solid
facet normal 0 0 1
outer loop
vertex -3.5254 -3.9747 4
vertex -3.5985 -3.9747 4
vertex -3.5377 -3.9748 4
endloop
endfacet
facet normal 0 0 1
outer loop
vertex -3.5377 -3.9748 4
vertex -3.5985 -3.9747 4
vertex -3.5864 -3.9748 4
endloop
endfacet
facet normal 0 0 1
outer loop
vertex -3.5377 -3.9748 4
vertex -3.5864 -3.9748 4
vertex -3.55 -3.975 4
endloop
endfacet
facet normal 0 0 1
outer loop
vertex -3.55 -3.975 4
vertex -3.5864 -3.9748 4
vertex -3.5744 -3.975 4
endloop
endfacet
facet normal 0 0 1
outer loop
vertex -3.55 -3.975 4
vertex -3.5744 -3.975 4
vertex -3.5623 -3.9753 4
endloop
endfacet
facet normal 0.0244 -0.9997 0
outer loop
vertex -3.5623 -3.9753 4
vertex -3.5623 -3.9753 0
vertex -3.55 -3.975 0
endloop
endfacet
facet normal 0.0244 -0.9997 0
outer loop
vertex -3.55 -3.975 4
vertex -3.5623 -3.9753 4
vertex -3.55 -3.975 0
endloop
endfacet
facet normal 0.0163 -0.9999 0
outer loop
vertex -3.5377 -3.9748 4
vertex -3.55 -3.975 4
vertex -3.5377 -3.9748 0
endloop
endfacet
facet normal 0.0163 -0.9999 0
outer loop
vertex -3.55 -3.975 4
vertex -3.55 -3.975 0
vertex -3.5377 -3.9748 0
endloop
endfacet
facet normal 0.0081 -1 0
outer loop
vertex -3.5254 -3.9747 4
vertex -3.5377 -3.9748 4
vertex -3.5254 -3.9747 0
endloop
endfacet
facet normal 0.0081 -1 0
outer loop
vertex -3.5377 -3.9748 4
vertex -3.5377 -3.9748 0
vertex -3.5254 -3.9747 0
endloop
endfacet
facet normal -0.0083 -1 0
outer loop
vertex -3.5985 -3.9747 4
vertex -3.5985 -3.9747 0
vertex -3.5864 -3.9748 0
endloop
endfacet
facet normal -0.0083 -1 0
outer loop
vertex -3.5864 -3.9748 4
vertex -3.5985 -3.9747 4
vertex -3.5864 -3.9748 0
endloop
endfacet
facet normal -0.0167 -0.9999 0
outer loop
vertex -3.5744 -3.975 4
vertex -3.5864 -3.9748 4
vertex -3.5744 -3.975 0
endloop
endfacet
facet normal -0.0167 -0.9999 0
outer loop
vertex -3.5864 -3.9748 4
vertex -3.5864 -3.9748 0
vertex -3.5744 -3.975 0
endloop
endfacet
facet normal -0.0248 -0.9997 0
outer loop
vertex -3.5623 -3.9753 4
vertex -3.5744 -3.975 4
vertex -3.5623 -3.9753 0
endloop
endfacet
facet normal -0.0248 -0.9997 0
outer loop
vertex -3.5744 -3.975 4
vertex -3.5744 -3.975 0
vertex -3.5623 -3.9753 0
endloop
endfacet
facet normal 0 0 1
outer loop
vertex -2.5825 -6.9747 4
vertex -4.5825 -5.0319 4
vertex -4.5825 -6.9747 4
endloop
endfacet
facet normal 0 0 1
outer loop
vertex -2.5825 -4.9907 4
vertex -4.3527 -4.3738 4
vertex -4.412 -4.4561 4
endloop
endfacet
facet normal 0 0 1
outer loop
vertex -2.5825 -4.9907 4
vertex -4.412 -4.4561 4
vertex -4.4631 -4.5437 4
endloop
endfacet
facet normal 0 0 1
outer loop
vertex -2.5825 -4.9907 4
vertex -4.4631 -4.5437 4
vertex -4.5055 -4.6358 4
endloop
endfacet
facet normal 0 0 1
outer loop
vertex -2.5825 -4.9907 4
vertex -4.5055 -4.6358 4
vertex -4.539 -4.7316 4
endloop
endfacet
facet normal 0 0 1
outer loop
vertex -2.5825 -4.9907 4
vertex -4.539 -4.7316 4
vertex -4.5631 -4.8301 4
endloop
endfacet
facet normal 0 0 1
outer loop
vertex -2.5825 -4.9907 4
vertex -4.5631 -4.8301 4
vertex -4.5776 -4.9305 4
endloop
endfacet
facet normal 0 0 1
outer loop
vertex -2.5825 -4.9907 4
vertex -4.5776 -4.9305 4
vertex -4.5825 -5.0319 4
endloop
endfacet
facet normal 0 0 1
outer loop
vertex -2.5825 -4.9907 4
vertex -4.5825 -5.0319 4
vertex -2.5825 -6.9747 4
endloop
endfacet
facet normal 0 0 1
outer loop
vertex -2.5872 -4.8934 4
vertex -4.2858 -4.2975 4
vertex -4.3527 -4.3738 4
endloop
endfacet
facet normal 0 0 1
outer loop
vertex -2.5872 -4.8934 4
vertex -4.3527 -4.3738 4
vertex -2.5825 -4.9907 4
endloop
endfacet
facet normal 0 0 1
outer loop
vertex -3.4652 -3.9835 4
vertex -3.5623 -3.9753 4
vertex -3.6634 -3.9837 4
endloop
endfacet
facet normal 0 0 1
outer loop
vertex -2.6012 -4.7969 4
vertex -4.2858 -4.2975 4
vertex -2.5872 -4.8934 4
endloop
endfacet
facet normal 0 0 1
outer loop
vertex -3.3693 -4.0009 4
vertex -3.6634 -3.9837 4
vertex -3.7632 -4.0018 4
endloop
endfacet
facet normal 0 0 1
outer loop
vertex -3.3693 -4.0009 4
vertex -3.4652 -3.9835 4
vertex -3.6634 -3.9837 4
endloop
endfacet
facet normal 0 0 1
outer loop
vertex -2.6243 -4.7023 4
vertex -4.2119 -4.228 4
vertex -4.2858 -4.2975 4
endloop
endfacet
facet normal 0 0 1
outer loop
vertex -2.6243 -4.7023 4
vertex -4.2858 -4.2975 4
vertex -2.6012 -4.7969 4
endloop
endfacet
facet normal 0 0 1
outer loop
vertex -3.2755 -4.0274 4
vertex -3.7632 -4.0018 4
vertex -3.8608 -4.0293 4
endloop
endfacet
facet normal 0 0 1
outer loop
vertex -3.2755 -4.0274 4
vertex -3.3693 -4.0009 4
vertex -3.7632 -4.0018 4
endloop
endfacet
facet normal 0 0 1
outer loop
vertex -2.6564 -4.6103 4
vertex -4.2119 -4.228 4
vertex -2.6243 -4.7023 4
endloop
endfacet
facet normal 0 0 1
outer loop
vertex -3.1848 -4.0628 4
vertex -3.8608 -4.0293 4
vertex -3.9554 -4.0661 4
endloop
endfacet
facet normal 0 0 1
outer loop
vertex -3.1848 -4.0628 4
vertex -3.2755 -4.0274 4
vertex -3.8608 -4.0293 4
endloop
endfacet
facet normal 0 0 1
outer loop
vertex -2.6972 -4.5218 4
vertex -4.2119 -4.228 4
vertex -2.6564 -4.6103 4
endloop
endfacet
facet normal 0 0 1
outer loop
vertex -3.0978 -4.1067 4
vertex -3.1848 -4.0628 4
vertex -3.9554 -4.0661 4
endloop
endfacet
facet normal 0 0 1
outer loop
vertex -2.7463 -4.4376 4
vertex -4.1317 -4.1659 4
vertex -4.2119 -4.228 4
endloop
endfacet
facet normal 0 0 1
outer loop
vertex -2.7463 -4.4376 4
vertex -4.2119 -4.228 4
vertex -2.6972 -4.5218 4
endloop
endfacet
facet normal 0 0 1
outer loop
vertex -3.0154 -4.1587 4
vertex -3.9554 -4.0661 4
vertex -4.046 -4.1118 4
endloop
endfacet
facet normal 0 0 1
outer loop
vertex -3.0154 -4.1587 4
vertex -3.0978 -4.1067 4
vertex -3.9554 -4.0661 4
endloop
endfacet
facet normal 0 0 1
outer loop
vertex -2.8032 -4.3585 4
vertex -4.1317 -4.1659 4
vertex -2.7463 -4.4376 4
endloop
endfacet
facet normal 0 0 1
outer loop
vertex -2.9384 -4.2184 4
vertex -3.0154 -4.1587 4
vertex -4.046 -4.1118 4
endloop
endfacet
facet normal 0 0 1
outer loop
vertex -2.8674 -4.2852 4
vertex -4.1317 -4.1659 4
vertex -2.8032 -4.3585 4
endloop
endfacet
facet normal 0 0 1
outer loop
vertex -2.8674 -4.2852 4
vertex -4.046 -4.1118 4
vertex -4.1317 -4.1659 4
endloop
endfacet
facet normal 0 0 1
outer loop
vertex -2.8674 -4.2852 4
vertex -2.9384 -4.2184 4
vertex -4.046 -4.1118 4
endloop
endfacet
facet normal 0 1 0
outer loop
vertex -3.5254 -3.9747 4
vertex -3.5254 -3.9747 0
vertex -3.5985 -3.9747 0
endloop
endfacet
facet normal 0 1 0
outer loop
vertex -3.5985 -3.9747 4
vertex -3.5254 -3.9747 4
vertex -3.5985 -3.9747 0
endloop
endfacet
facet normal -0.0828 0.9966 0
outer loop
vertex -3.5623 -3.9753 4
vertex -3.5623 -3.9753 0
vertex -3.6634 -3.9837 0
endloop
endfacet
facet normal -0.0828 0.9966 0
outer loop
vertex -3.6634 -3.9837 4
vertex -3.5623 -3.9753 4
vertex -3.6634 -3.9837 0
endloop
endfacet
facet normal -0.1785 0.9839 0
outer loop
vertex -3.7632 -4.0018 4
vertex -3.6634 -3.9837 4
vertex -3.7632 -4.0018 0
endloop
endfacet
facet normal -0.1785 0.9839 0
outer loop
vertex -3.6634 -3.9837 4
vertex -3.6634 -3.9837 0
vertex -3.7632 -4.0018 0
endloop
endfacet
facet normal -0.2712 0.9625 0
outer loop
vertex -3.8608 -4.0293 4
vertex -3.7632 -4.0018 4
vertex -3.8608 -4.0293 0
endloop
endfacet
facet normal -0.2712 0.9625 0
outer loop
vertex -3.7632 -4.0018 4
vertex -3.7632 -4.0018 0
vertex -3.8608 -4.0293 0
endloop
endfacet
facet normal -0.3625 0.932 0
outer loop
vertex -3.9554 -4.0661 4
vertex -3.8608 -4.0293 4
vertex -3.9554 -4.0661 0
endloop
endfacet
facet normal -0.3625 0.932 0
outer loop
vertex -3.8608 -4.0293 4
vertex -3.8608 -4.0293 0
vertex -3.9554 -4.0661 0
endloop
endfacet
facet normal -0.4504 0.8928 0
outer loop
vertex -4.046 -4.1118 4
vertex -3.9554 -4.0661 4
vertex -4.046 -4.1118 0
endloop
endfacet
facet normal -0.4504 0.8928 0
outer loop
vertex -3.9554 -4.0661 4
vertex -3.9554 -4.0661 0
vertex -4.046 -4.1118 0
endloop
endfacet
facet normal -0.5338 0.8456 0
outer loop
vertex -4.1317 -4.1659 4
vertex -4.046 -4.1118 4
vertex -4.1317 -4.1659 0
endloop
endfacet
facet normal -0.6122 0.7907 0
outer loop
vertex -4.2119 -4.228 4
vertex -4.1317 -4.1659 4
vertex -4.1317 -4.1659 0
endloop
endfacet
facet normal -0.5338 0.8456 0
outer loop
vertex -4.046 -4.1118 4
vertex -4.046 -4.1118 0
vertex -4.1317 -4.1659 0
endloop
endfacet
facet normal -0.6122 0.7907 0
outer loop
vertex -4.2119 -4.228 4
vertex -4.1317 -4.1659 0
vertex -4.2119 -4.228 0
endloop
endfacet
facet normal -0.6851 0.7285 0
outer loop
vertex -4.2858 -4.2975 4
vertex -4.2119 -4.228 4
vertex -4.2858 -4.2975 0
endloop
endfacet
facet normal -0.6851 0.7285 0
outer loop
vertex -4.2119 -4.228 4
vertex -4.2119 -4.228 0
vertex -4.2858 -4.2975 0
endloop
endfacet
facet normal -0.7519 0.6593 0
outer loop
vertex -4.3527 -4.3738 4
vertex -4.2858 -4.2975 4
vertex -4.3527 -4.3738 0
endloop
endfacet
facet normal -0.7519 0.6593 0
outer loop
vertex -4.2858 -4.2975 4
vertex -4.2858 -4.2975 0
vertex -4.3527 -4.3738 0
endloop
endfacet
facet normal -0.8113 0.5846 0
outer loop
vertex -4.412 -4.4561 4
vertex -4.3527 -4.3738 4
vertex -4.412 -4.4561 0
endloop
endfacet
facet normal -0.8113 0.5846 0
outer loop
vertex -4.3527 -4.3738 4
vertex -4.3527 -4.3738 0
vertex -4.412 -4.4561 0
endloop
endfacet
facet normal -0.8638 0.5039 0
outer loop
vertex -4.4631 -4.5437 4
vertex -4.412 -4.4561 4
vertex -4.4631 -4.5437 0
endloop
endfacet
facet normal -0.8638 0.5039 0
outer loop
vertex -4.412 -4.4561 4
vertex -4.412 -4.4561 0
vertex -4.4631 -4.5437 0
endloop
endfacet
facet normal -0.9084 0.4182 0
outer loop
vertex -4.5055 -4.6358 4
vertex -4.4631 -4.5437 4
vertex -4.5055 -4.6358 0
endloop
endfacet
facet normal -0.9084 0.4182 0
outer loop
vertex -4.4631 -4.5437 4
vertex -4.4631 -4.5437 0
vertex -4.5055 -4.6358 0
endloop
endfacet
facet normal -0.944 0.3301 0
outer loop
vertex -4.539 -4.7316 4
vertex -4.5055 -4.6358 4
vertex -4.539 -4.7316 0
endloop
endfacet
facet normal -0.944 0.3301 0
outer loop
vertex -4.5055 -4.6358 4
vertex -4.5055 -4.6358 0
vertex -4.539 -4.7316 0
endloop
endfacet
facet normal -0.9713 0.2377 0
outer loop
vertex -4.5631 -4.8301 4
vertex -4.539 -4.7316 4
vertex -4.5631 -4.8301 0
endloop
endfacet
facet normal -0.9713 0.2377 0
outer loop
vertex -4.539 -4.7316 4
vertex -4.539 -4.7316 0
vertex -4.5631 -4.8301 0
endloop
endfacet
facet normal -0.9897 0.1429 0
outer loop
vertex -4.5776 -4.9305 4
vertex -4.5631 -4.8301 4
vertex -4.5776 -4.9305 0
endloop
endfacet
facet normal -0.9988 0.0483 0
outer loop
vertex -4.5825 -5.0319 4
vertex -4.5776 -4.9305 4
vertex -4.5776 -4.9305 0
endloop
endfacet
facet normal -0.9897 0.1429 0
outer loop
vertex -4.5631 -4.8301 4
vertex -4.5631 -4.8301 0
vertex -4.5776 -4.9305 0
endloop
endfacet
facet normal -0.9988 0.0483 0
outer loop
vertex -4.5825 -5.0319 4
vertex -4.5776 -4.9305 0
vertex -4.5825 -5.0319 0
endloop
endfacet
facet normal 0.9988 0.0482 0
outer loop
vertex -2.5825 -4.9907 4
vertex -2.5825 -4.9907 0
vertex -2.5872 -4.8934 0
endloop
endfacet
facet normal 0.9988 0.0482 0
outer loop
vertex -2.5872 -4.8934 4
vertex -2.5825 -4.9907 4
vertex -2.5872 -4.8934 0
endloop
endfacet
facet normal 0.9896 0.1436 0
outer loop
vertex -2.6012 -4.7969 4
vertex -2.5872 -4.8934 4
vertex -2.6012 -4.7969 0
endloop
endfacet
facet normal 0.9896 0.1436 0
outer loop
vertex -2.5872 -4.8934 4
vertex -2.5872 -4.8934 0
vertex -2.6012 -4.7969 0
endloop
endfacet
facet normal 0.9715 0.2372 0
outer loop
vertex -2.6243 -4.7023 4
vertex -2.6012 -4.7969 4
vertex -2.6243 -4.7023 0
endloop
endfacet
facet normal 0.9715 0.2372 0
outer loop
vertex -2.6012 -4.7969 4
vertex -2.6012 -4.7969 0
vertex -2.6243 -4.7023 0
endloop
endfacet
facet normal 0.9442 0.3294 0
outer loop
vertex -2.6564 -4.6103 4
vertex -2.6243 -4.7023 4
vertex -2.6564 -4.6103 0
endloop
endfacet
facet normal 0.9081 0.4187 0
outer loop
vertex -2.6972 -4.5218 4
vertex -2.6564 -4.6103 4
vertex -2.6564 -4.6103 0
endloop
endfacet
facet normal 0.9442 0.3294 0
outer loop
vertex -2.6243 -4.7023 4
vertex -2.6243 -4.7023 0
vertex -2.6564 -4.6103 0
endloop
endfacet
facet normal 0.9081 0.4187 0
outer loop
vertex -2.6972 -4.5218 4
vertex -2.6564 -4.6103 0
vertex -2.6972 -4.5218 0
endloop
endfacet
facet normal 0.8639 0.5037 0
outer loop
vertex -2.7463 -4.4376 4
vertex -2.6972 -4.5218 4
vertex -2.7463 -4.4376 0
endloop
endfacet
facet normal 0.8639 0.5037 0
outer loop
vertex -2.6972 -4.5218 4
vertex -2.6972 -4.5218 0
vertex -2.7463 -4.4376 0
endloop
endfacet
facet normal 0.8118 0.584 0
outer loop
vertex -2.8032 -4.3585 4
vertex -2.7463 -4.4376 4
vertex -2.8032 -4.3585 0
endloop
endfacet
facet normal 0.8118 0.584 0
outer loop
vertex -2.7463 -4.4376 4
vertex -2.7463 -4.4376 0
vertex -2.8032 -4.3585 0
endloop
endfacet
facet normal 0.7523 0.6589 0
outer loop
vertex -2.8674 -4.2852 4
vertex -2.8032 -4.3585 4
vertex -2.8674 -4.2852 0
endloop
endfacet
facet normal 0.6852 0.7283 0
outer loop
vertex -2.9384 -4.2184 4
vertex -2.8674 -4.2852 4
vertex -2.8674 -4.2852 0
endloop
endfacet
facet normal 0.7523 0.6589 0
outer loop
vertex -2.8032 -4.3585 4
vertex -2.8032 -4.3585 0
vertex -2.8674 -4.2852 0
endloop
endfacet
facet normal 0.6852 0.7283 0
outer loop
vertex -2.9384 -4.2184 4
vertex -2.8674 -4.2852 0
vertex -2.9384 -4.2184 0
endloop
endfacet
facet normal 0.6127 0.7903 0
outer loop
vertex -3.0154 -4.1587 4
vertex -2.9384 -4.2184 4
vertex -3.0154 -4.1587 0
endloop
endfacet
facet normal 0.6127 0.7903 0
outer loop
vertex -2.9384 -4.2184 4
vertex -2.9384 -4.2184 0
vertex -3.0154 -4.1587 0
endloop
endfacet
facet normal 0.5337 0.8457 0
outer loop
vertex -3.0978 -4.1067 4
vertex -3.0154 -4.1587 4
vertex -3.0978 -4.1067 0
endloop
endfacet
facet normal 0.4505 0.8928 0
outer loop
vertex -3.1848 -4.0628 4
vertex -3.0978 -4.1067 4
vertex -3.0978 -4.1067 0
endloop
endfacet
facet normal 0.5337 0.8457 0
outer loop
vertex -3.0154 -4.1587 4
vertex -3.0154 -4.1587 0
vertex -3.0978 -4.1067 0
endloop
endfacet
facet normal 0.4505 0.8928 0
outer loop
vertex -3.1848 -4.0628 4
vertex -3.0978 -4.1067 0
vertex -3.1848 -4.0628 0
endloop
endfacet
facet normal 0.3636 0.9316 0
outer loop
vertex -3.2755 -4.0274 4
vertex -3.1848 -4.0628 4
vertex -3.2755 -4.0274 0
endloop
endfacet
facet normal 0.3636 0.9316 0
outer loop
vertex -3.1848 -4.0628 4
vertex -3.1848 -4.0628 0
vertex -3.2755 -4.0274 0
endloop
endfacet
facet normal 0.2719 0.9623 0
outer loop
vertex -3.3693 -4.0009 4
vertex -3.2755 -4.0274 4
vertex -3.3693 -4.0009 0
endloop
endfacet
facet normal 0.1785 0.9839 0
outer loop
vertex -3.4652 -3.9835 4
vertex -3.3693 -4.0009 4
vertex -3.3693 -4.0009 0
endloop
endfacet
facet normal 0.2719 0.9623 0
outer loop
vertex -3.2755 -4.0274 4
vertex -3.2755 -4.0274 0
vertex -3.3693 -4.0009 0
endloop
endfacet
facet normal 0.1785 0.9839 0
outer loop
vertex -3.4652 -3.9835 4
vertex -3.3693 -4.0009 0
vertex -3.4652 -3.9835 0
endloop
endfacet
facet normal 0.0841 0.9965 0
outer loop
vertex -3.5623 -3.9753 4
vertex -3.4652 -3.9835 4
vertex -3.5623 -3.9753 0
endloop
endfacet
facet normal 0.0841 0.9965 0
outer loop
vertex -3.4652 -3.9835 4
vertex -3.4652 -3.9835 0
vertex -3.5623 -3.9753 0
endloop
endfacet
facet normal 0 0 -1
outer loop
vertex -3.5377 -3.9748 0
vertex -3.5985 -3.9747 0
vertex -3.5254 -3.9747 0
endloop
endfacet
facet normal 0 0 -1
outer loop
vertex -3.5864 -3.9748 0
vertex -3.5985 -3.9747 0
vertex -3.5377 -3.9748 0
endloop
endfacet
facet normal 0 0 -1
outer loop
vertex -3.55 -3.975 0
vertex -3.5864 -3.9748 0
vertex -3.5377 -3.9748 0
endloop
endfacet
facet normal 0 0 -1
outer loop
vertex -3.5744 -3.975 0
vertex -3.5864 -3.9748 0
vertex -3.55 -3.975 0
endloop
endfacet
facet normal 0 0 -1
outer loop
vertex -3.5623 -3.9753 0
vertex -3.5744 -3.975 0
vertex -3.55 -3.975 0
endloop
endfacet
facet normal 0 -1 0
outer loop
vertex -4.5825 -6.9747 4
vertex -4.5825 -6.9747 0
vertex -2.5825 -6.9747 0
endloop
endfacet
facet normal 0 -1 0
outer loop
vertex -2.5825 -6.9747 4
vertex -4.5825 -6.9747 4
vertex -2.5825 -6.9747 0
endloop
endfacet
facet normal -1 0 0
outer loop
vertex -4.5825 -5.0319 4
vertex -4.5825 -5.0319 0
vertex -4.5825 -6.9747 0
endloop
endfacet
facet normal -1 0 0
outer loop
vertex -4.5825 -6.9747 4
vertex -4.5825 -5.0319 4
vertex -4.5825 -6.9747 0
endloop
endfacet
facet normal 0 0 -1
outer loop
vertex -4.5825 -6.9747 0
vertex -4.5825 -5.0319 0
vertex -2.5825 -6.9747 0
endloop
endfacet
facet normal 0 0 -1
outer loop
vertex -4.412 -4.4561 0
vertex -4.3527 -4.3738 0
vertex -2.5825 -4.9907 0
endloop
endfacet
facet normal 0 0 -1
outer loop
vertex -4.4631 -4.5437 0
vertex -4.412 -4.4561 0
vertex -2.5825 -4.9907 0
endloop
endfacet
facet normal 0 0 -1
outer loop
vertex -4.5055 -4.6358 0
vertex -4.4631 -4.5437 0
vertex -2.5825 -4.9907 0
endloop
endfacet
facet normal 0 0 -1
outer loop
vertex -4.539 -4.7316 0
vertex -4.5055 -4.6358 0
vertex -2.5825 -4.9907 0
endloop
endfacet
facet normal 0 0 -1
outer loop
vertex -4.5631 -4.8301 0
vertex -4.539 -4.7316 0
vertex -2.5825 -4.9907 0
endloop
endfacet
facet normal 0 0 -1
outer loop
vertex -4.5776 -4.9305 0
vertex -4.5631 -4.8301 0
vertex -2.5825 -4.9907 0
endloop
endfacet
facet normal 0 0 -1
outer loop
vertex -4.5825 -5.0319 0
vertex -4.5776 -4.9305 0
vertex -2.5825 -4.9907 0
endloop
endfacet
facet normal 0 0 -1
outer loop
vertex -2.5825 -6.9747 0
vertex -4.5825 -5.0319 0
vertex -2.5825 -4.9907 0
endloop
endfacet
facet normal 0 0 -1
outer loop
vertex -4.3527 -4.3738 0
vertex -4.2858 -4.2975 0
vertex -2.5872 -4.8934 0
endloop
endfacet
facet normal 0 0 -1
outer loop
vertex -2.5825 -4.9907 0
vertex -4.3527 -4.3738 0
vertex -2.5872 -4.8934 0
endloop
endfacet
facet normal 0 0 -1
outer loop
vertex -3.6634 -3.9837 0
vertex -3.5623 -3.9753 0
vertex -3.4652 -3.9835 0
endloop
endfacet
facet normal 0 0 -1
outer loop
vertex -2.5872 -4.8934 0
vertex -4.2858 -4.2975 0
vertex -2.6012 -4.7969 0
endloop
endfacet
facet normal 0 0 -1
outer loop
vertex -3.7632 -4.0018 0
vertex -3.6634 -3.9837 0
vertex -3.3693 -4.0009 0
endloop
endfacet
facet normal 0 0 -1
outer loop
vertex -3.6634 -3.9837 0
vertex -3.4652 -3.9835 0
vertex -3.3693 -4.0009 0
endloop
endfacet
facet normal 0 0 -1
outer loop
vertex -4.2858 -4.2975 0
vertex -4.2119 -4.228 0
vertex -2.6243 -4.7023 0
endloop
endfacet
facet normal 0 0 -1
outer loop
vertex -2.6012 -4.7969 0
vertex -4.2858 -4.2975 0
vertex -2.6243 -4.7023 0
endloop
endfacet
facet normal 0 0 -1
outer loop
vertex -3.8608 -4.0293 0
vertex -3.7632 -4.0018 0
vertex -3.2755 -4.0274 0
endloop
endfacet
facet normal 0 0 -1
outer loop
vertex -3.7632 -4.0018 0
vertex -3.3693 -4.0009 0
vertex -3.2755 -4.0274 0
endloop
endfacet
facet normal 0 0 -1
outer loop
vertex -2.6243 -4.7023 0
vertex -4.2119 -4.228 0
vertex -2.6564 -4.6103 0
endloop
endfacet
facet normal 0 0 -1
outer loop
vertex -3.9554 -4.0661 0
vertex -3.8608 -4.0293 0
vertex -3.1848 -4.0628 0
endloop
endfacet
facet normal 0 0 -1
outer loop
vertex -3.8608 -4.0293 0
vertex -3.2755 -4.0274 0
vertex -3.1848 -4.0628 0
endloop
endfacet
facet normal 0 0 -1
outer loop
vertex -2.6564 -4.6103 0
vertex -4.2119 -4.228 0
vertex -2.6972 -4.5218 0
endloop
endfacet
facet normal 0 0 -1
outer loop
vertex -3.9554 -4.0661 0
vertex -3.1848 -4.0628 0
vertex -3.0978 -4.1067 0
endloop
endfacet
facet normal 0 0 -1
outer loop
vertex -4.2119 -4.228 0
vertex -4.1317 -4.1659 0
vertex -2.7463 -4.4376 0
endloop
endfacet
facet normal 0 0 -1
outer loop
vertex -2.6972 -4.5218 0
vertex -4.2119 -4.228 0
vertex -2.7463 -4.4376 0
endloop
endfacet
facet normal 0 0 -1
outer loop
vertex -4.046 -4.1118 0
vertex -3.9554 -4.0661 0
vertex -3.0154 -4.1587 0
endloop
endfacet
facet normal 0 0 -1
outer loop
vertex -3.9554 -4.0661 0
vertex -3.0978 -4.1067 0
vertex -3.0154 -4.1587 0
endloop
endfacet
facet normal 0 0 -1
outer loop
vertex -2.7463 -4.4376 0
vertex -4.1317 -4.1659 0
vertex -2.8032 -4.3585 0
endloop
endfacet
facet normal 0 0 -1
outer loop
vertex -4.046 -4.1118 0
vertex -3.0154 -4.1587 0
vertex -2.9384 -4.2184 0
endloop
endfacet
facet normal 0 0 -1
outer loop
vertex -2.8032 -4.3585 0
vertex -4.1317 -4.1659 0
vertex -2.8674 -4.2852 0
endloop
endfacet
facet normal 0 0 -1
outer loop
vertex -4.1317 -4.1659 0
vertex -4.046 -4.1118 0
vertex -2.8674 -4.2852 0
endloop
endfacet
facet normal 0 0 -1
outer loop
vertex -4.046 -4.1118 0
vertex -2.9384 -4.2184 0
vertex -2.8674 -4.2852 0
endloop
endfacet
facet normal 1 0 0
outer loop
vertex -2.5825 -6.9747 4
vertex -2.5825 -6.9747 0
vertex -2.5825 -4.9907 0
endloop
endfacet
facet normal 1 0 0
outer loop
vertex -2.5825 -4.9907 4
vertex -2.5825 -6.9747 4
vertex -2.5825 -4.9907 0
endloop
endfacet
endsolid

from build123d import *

# Parameters (mm, degrees)
F1_DEPTH = 4


with BuildPart() as f1:
    # F0 (on Top) → F1 (new body)
    with BuildSketch(Plane.XY):
        with BuildLine():
            Line((-4.5825140551, -5.0318525356), (-4.5825140551, -6.9746974812))
            Line((-4.5825140551, -6.9746974812), (-2.5825140551, -6.9746974812))
            Line((-2.5825140551, -6.9746974812), (-2.5825140551, -4.9906974812))
            ThreePointArc((-2.5825140551, -4.9906974812), (-2.8674019742, -4.2851968609), (-3.5622997345, -3.9753430982))
            ThreePointArc((-3.5622997345, -3.9753430982), (-4.2858288859, -4.2975076829), (-4.5825140551, -5.0318525356))
        make_face()
    extrude(amount=F1_DEPTH)


with BuildPart() as f1b:
    # F0 (on Top) → F1, piece 2 (new body)
    with BuildSketch(Plane.XY):
        with BuildLine():
            ThreePointArc((-3.5985140551, -3.9746974812), (-3.5804040176, -3.9748588983), (-3.5622997345, -3.9753430982))
            ThreePointArc((-3.5622997345, -3.9753430982), (-3.5438321882, -3.9748588978), (-3.5253590006, -3.9746974812))
            Line((-3.5253590006, -3.9746974812), (-3.5985140551, -3.9746974812))
        make_face()
    extrude(amount=F1_DEPTH)


solid = Compound([f1.part, f1b.part])
